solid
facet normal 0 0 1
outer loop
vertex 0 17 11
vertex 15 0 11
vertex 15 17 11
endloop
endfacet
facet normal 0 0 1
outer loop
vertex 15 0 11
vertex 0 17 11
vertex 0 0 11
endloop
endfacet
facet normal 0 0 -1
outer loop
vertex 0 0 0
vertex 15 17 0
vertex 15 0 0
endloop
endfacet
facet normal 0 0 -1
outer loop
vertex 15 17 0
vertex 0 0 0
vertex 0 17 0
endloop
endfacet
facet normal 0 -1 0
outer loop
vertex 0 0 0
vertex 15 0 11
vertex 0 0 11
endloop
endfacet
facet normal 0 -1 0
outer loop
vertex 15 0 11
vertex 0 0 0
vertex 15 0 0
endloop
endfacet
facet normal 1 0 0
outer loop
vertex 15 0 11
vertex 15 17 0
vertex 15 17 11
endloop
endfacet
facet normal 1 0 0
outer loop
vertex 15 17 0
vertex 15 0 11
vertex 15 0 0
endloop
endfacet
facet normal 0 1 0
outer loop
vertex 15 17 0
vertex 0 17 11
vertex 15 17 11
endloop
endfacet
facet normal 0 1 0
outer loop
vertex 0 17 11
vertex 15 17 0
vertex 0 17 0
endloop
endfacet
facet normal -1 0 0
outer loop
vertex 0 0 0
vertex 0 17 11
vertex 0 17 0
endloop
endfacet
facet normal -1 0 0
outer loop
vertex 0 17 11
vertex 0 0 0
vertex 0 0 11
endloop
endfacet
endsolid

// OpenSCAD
// Generated by SolidPython 1.0.1 on 2020-07-29 00:46:55


cube(size = [15, 17, 11]);
/***********************************************
*********      SolidPython code:      **********
************************************************
 
# import packages: SolidPython
from solid import *
from solid.utils import *
from itertools import chain, combinations, permutations


class Resize:

    def __init__(self, scad_file):
        self.scad_file = scad_file
        #self.scad_file = import_scad(scad_file)
        # cone/cylinder param:
        self.r1 = 0
        self.r2 = 0
        self.h = 0
        # rectangular prism param:
        self.w = 0
        self.l = 0
        # ellipse param:
        self.r = 0

    # import OpenScad code (file name corresponds to shape)


    # classify shape + parameters
    def assign(self, param1, param2, param3):
        if self.scad_file == 'cone.scad':
            self.r1 = param1
            self.r2 = param2
            self.h = param3
        elif self.scad_file == 'cylinder.scad':
            self.r1 = param1
            self.r2 = param2
            self.h = param3
        elif self.scad_file == 'rectangularPrism.scad':
            self.h = param1
            self.l = param2
            self.w = param3
        else:
            self.r = param1
            self.h = param2

    # resize parameters
    def iterate(self):
        x = range(3, 20, 2)
        i = 1
        if self.scad_file == 'cone.scad':
            tempList = list(permutations(x, 2))
            for temp in tempList:
                param1 = temp[0]
                param2 = temp[1]
                filepath = 'produced_scad_files/' + 'cone' + str(param1) + '_' + str(param2) + '_' + '.scad'
                scad_render_to_file(cylinder(h=param1, r1=param2, r2=0), filepath)

        elif self.scad_file == 'cylinder.scad':
            tempList = list(permutations(x, 3))
            for temp in tempList:
                param1 = temp[0]
                param2 = temp[1]
                filepath = 'produced_scad_files/' + 'cylinder' + str(param1) + '_' + str(param2) + '_' + '.scad'
                scad_render_to_file(cylinder(h=param1, r1=param2, r2=param2), filepath)

        elif self.scad_file == 'rectangularPrism.scad':
            tempList = list(permutations(x, 3))
            for temp in tempList:
                param1 = temp[0]
                param2 = temp[1]
                param3 = temp[2]
                filepath = 'produced_scad_files/' + 'rectangularPrism' + str(param1) + '_' + str(param2) + '_' + str(
                    param3) + '.scad'
                scad_render_to_file(cube(size=(param1, param2, param3)), filepath)

        elif self.scad_file == 'ellipse.scad':
            tempList = list(permutations(x, 4))
            for temp in tempList:
                param1 = temp[0]
                param2 = temp[1]
                param3 = temp[2]
                param4 = temp[3]
                filepath = 'produced_scad_files/' + 'ellipse' + str(param1) + '_' + str(param2) + '_' + str(param3) + '_' + str(param4) + '.scad'
                scad_render_to_file(scale([param1, param2, param3])(sphere(r=param4)), filepath)

    def render_to_scadfile(self):
        scad_render_to_file(scad, 'example.scad') 
 
************************************************/
